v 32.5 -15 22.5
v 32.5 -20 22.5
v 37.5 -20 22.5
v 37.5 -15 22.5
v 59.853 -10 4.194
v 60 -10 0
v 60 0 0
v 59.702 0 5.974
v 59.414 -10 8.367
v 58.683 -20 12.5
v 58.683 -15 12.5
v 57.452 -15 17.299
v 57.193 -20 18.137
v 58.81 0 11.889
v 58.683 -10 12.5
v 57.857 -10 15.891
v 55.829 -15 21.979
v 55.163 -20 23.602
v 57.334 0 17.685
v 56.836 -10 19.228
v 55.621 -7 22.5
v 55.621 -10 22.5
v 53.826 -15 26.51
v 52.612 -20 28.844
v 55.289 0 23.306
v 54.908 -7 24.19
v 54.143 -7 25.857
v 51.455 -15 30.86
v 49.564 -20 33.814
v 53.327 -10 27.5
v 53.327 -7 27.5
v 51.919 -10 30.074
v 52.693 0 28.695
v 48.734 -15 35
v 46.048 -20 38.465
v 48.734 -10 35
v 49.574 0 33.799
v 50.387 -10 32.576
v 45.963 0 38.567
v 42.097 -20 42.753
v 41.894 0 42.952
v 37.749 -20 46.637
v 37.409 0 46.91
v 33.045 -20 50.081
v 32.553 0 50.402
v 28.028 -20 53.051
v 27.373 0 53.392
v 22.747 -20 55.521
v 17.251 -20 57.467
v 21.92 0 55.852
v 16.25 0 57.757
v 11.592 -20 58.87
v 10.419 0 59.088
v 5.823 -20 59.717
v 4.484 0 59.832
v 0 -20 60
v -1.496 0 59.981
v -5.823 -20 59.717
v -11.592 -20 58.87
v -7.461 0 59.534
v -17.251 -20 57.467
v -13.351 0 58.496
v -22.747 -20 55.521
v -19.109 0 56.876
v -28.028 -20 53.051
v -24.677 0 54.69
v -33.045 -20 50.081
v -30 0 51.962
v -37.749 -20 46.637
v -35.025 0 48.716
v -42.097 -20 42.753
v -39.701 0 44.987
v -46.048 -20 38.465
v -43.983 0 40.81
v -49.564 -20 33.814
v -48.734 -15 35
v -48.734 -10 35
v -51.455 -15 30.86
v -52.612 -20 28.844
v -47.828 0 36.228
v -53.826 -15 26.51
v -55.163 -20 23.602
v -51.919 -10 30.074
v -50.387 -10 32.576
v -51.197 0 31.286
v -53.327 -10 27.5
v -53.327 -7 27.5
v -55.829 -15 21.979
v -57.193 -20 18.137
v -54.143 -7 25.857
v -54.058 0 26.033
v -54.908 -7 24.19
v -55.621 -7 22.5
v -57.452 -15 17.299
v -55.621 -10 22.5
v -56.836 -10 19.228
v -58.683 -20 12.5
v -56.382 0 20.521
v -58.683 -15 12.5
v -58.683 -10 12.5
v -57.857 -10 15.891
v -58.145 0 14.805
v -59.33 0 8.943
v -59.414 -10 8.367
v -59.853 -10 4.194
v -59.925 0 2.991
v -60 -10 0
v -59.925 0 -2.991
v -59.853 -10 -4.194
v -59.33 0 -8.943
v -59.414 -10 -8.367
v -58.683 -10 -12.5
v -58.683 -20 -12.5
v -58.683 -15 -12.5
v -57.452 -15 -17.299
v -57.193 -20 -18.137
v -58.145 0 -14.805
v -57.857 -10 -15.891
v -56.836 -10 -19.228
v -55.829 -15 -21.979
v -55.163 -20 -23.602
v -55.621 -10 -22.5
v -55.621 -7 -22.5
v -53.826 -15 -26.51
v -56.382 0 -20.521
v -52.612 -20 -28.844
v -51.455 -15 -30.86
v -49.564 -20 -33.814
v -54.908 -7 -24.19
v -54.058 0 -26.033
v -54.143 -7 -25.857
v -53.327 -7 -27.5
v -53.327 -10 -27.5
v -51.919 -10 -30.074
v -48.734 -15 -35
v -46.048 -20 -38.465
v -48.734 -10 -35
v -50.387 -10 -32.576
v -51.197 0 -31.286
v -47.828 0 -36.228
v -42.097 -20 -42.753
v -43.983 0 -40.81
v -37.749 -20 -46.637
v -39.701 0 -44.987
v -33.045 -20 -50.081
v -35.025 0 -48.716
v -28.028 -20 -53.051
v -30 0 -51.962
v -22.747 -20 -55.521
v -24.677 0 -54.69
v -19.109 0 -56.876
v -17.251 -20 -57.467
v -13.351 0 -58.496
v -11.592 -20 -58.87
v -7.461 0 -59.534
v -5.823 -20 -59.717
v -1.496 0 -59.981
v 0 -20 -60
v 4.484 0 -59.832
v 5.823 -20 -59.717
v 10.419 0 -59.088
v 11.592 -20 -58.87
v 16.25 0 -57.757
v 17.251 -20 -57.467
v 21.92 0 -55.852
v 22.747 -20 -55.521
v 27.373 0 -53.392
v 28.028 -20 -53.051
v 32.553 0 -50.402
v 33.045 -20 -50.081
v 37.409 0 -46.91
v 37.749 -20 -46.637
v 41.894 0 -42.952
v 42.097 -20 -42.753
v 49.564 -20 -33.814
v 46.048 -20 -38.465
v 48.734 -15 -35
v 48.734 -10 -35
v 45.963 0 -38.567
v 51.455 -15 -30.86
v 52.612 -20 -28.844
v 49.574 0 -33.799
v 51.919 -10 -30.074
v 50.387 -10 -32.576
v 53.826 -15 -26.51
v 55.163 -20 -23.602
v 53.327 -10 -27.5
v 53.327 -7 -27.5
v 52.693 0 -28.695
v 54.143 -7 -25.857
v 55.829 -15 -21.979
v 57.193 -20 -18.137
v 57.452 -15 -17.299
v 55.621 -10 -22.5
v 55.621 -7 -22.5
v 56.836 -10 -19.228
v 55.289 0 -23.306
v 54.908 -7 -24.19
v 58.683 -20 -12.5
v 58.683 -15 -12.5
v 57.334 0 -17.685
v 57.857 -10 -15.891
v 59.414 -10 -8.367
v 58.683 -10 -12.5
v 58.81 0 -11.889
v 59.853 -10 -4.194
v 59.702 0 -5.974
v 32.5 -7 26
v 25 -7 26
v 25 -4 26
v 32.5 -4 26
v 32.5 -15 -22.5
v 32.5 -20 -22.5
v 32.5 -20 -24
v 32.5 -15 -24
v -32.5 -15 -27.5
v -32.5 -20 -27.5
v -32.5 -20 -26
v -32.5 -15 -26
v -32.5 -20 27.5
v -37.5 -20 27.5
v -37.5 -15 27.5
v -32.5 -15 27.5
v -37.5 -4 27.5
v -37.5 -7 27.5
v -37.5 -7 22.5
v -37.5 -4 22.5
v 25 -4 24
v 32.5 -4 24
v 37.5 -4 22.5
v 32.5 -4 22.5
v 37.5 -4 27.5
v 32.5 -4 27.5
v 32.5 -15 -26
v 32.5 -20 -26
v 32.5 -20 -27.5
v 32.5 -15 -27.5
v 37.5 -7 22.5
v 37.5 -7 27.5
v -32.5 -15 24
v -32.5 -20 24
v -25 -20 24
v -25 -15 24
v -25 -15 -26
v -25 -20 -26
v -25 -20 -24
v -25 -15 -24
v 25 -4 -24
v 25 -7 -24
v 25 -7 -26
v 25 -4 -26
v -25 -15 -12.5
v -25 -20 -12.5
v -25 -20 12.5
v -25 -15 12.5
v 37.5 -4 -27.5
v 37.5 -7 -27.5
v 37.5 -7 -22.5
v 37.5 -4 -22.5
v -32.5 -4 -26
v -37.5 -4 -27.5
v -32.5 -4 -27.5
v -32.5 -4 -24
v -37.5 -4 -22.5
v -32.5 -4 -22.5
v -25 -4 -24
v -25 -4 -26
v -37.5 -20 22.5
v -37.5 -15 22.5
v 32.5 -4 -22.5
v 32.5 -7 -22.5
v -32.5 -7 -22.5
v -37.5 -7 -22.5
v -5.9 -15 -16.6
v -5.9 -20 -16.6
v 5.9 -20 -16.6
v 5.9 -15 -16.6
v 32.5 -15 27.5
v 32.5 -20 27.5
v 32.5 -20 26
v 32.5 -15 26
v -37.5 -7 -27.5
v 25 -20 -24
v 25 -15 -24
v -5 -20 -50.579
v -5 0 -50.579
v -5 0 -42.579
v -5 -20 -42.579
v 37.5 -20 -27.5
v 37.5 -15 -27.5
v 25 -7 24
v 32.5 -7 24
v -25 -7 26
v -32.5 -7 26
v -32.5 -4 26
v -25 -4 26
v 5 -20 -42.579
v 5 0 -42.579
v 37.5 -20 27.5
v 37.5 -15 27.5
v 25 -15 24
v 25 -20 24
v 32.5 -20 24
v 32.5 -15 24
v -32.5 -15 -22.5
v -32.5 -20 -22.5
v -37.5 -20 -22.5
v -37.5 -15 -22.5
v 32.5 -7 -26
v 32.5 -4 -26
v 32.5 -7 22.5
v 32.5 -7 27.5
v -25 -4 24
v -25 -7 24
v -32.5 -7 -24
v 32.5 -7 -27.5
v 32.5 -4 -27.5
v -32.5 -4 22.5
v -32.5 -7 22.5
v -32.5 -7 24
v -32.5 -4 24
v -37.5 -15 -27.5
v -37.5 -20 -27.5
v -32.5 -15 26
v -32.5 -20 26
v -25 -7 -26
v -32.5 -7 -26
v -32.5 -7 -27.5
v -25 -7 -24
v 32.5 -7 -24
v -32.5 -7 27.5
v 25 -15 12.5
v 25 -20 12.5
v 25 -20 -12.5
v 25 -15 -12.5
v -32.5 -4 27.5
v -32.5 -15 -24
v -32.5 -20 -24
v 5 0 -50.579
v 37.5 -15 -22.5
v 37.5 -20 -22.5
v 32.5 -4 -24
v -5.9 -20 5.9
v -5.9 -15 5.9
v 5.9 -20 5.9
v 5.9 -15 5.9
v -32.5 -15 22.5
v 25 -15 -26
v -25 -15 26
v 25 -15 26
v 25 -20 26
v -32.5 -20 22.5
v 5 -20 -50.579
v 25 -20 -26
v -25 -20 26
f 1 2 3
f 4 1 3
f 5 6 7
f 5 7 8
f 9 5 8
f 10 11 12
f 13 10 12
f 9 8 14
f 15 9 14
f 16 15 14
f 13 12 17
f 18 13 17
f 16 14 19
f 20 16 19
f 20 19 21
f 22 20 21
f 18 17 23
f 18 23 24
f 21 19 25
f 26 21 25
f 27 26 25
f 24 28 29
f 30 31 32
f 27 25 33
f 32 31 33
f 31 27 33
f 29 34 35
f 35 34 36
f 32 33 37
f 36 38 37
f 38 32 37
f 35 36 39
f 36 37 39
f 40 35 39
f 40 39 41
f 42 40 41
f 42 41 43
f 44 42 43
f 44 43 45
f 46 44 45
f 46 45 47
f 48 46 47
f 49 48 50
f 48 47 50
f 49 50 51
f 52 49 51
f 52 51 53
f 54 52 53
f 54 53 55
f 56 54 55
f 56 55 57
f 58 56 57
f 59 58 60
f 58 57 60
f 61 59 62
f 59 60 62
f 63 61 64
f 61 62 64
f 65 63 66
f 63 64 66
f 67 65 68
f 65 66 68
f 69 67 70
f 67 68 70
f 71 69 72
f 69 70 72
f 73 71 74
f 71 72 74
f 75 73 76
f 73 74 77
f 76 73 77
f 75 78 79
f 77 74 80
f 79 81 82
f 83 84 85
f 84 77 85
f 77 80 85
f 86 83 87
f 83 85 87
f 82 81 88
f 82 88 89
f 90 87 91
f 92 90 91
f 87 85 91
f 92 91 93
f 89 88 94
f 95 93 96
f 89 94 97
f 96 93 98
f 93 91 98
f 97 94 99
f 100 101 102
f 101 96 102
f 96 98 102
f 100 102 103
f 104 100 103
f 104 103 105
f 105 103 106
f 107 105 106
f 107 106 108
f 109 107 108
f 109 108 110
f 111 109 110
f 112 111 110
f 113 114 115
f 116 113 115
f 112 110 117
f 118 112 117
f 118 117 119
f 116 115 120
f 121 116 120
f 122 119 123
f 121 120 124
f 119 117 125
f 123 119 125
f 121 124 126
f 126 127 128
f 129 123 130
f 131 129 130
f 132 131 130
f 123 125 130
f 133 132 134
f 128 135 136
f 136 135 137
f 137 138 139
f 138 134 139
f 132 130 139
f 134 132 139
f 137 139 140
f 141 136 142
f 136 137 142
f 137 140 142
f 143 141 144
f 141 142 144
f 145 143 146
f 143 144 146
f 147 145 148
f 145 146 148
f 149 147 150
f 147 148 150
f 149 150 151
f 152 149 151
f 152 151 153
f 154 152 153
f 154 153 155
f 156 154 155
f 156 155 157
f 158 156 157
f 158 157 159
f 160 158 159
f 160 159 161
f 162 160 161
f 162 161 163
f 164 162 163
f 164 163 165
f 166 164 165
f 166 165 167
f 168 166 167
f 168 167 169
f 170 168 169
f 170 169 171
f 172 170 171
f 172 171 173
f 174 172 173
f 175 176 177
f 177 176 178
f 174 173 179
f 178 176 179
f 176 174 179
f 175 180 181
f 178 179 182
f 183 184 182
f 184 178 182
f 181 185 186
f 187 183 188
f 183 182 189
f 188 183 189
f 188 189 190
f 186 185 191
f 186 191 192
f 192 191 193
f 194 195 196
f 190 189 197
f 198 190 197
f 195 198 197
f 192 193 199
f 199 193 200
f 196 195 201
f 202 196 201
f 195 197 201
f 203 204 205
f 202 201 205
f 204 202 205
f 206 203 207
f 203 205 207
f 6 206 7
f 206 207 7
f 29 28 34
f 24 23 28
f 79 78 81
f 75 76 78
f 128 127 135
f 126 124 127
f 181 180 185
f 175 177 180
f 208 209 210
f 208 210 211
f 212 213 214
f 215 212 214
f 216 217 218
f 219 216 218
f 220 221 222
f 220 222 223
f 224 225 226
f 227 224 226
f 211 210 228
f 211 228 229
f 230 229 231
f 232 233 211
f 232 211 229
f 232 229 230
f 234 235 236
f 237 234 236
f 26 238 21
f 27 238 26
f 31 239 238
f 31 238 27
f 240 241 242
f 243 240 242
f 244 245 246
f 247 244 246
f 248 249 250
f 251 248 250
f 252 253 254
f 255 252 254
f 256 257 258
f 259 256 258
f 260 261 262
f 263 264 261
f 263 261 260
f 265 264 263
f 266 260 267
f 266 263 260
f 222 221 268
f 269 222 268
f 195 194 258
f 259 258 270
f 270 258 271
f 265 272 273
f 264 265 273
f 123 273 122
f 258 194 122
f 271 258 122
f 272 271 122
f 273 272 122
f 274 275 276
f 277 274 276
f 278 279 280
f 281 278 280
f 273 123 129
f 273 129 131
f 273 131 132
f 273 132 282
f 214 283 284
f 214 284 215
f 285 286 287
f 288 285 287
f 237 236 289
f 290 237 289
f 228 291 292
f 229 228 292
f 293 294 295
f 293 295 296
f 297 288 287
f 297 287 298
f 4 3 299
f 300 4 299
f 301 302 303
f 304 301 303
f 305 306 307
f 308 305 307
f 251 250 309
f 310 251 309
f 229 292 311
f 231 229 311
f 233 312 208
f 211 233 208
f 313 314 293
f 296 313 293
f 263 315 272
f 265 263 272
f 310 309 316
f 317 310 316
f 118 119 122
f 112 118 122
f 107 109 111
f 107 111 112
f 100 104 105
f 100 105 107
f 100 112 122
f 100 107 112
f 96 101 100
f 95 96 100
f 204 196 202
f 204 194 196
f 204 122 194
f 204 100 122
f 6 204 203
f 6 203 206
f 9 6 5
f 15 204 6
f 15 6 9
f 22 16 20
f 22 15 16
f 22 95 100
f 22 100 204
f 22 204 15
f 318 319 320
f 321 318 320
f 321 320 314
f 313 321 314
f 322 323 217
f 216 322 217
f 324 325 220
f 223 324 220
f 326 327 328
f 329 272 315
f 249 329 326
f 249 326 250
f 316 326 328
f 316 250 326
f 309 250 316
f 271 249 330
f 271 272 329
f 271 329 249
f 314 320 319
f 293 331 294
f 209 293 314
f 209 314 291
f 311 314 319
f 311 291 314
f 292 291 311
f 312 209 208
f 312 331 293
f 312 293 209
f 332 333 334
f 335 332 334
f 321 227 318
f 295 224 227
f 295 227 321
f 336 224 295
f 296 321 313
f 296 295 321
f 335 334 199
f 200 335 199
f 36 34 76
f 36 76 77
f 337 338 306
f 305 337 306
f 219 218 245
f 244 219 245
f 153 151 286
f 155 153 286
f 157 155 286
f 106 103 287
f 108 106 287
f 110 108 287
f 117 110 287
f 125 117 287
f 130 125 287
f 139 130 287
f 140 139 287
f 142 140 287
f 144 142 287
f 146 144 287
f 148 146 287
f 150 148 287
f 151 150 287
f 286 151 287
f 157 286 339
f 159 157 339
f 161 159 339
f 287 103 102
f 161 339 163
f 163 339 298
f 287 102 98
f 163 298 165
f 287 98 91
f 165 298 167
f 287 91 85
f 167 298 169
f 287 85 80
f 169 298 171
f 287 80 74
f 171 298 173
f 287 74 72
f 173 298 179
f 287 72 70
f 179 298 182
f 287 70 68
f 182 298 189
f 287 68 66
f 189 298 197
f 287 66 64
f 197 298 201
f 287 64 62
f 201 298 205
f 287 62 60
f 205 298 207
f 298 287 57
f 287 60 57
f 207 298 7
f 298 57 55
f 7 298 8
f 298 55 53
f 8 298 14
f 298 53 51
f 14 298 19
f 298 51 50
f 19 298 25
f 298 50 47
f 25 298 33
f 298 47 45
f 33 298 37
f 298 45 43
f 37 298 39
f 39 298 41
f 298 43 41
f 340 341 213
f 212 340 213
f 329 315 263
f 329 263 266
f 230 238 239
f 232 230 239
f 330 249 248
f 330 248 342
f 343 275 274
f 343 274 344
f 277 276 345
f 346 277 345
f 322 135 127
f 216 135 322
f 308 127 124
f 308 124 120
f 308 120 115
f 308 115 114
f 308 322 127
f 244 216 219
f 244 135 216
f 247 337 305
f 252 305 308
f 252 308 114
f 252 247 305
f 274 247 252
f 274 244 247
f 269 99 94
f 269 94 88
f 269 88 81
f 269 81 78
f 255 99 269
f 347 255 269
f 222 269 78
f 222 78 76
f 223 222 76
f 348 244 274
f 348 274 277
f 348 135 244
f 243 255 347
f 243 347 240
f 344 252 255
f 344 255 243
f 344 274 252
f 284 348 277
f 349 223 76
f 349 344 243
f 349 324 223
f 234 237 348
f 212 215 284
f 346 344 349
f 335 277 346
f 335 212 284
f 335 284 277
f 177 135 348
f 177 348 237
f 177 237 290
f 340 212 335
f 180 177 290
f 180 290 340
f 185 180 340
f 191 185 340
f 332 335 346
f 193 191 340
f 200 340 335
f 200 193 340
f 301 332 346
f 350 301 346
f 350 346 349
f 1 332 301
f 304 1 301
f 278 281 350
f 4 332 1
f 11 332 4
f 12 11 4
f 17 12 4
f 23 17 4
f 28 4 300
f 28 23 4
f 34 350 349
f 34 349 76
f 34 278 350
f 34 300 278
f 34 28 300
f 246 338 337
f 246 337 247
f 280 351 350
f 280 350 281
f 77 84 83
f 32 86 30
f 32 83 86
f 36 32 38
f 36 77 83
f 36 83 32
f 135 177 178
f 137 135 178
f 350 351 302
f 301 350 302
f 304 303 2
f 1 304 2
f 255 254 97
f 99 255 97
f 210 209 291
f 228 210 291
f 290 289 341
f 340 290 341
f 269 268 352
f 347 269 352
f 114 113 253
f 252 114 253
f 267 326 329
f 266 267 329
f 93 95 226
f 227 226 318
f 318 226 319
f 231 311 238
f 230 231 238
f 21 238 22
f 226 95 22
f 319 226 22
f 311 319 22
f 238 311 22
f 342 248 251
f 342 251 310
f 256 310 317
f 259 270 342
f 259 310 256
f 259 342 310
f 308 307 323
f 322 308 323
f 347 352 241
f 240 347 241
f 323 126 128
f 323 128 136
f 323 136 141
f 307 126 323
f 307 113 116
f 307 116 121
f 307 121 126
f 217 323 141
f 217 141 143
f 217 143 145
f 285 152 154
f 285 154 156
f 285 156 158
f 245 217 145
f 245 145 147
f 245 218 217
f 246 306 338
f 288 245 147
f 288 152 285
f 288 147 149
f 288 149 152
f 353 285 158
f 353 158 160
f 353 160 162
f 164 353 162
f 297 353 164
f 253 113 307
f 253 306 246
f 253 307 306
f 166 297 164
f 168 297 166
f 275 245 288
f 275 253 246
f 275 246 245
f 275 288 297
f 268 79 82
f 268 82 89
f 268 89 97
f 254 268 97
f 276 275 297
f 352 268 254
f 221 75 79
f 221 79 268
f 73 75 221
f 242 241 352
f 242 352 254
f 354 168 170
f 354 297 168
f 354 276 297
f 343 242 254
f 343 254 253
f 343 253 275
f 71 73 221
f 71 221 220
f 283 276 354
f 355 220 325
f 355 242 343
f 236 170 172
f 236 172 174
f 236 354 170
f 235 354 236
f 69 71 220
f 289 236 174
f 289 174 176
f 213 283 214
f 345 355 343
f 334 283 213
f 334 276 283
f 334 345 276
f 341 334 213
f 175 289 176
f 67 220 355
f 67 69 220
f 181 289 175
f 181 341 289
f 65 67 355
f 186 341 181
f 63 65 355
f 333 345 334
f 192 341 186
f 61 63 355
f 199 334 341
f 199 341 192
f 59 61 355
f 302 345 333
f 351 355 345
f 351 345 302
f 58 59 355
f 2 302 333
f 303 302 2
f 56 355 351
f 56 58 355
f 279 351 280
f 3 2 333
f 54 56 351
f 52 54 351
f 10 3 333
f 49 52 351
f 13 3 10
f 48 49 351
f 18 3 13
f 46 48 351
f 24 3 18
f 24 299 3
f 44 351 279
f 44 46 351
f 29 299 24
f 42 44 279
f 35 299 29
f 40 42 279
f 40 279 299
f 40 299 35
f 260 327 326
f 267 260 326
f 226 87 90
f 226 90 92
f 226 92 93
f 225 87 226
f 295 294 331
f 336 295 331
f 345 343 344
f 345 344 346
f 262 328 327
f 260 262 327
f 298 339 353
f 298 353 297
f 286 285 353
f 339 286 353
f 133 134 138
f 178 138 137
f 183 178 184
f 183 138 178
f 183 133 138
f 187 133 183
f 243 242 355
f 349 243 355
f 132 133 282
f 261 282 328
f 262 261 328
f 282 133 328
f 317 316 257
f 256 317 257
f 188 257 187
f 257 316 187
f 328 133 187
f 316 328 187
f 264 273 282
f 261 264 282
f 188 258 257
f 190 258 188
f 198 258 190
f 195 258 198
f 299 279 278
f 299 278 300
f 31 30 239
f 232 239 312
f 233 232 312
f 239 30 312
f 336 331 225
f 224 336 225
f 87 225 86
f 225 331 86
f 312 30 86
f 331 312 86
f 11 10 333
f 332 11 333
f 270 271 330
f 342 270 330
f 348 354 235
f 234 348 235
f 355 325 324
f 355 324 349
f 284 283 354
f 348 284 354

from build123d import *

# Parameters (mm, degrees)
F0_R      = 60
F1_DEPTH  = 20
F3_DEPTH  = 10
F4_W      = 5
F4_H      = 70
F5_DEPTH  = 60
F7_DEPTH  = 3
F8_W      = 11.8
F8_H      = 22.5
F9_DEPTH  = 6
F10_W     = 5
F10_H     = 1.5
F10_W_2   = 2.5
F10_H_2   = 1
F10_W_3   = 7.5
F11_DEPTH = 16
F12_W     = 10
F12_H     = 8
F13_DEPTH = 20.001


with BuildPart() as f1:
    # F0 (on Front) → F1 (new body)
    with BuildSketch(Plane.XZ):
        Circle(F0_R)
    extrude(amount=F1_DEPTH)

    # F2 (on face) → F3 (cut)
    with BuildSketch(Plane.XZ.offset(20)):
        with BuildLine():
            Line((-25, -12.5), (-25, 12.5))
            Line((-25, 12.5), (-58.6834729715, 12.5))
            ThreePointArc((-58.6834729715, 12.5), (-59.6699605258, 6.2845692656), (-60, 0))
            ThreePointArc((-60, 0), (-59.6699605258, -6.2845692656), (-58.6834729715, -12.5))
            Line((-58.6834729715, -12.5), (-25, -12.5))
        make_face()
        with BuildLine():
            Line((58.6834729715, 12.5), (25, 12.5))
            Line((25, 12.5), (25, -12.5))
            Line((25, -12.5), (58.6834729715, -12.5))
            ThreePointArc((58.6834729715, -12.5), (59.6699605258, -6.2845692656), (60, 0))
            ThreePointArc((60, 0), (59.6699605258, 6.2845692656), (58.6834729715, 12.5))
        make_face()
    extrude(amount=-F3_DEPTH, mode=Mode.SUBTRACT)

    # F4 (on Right) → F5 (cut, symmetric)
    with BuildSketch(Plane.YZ):
        with Locations((-12.5, 0)):
            Rectangle(F4_W, F4_H)
    extrude(amount=F5_DEPTH, both=True, mode=Mode.SUBTRACT)

    # F6 (on face) → F7 (cut)
    with BuildSketch(Plane.XZ.offset(10)):
        with BuildLine():
            Line((30, -22.5), (30, -25))
            Line((30, -25), (-30, -25))
            Line((-30, -25), (-30, -22.5))
            Line((-30, -22.5), (-55.6214886532, -22.5))
            ThreePointArc((-55.6214886532, -22.5), (-54.531492065, -25.0263136152), (-53.3268225193, -27.5))
            Line((-53.3268225193, -27.5), (0, -27.5))
            Line((0, -27.5), (53.3268225193, -27.5))
            ThreePointArc((53.3268225193, -27.5), (54.531492065, -25.0263136152), (55.6214886532, -22.5))
            Line((55.6214886532, -22.5), (30, -22.5))
        make_face()
        with BuildLine():
            Line((30, 25), (30, 22.5))
            Line((30, 22.5), (55.6214886532, 22.5))
            ThreePointArc((55.6214886532, 22.5), (54.531492065, 25.0263136152), (53.3268225193, 27.5))
            Line((53.3268225193, 27.5), (0, 27.5))
            Line((0, 27.5), (-53.3268225193, 27.5))
            ThreePointArc((-53.3268225193, 27.5), (-54.531492065, 25.0263136152), (-55.6214886532, 22.5))
            Line((-55.6214886532, 22.5), (-30, 22.5))
            Line((-30, 22.5), (-30, 25))
            Line((-30, 25), (30, 25))
        make_face()
        Polygon((0, 22.5), (30, 22.5), (30, 25), (-30, 25), (-30, 22.5), align=None)
        Polygon((-30, -25), (30, -25), (30, -22.5), (0, -22.5), (-30, -22.5), align=None)
    extrude(amount=-F7_DEPTH, mode=Mode.SUBTRACT)

    # F8 (on face) → F9 (cut)
    with BuildSketch(Plane.XZ.offset(20)):
        with Locations((0, -5.35)):
            Rectangle(F8_W, F8_H)
    extrude(amount=-F9_DEPTH, mode=Mode.SUBTRACT)

    # F10 (on face) → F11 (cut)
    with BuildSketch(Plane.XZ.offset(20)):
        with Locations((-35, 26.75)):
            Rectangle(F10_W, F10_H)
        with Locations((-33.75, 24.5)):
            Rectangle(F10_W_2, F10_H_2)
        with Locations((35, 26.75)):
            Rectangle(F10_W, F10_H)
        with Locations((33.75, 24.5)):
            Rectangle(F10_W_2, F10_H_2)
        with Locations((35, -26.75)):
            Rectangle(F10_W, F10_H)
        with Locations((33.75, -24.5)):
            Rectangle(F10_W_2, F10_H_2)
        with Locations((-35, -26.75)):
            Rectangle(F10_W, F10_H)
        with Locations((-33.75, -24.5)):
            Rectangle(F10_W_2, F10_H_2)
        Polygon((32.5, 25), (35, 25), (35, 24), (37.5, 24), (37.5, 26), (32.5, 26), align=None)
        with Locations((36.25, 23.25)):
            Rectangle(F10_W_2, F10_H)
        with Locations((33.75, 23.25)):
            Rectangle(F10_W_2, F10_H)
        with Locations((28.75, 24.5)):
            Rectangle(F10_W_3, F10_H_2)
        with Locations((28.75, 25.5)):
            Rectangle(F10_W_3, F10_H_2)
        Polygon((-35, -25), (-35, -24), (-37.5, -24), (-37.5, -26), (-32.5, -26), (-32.5, -25), align=None)
        with Locations((-33.75, -23.25)):
            Rectangle(F10_W_2, F10_H)
        with Locations((-36.25, -23.25)):
            Rectangle(F10_W_2, F10_H)
        with Locations((-28.75, -24.5)):
            Rectangle(F10_W_3, F10_H_2)
        with Locations((-28.75, -25.5)):
            Rectangle(F10_W_3, F10_H_2)
        Polygon((37.5, -24), (35, -24), (35, -25), (32.5, -25), (32.5, -26), (37.5, -26), align=None)
        with Locations((36.25, -23.25)):
            Rectangle(F10_W_2, F10_H)
        with Locations((33.75, -23.25)):
            Rectangle(F10_W_2, F10_H)
        Polygon((-35, 25), (-32.5, 25), (-32.5, 26), (-37.5, 26), (-37.5, 24), (-35, 24), align=None)
        with Locations((-36.25, 23.25)):
            Rectangle(F10_W_2, F10_H)
        with Locations((-33.75, 23.25)):
            Rectangle(F10_W_2, F10_H)
        with Locations((-28.75, 25.5)):
            Rectangle(F10_W_3, F10_H_2)
        with Locations((-28.75, 24.5)):
            Rectangle(F10_W_3, F10_H_2)
        with Locations((28.75, -25.5)):
            Rectangle(F10_W_3, F10_H_2)
        with Locations((28.75, -24.5)):
            Rectangle(F10_W_3, F10_H_2)
    extrude(amount=-F11_DEPTH, mode=Mode.SUBTRACT)

    # F12 (on face) → F13 (cut, through all)
    with BuildSketch(Plane.XZ.offset(20)):
        with Locations((0, -46.5785360177)):
            Rectangle(F12_W, F12_H)
    extrude(amount=-F13_DEPTH, mode=Mode.SUBTRACT)


solid = f1.part
